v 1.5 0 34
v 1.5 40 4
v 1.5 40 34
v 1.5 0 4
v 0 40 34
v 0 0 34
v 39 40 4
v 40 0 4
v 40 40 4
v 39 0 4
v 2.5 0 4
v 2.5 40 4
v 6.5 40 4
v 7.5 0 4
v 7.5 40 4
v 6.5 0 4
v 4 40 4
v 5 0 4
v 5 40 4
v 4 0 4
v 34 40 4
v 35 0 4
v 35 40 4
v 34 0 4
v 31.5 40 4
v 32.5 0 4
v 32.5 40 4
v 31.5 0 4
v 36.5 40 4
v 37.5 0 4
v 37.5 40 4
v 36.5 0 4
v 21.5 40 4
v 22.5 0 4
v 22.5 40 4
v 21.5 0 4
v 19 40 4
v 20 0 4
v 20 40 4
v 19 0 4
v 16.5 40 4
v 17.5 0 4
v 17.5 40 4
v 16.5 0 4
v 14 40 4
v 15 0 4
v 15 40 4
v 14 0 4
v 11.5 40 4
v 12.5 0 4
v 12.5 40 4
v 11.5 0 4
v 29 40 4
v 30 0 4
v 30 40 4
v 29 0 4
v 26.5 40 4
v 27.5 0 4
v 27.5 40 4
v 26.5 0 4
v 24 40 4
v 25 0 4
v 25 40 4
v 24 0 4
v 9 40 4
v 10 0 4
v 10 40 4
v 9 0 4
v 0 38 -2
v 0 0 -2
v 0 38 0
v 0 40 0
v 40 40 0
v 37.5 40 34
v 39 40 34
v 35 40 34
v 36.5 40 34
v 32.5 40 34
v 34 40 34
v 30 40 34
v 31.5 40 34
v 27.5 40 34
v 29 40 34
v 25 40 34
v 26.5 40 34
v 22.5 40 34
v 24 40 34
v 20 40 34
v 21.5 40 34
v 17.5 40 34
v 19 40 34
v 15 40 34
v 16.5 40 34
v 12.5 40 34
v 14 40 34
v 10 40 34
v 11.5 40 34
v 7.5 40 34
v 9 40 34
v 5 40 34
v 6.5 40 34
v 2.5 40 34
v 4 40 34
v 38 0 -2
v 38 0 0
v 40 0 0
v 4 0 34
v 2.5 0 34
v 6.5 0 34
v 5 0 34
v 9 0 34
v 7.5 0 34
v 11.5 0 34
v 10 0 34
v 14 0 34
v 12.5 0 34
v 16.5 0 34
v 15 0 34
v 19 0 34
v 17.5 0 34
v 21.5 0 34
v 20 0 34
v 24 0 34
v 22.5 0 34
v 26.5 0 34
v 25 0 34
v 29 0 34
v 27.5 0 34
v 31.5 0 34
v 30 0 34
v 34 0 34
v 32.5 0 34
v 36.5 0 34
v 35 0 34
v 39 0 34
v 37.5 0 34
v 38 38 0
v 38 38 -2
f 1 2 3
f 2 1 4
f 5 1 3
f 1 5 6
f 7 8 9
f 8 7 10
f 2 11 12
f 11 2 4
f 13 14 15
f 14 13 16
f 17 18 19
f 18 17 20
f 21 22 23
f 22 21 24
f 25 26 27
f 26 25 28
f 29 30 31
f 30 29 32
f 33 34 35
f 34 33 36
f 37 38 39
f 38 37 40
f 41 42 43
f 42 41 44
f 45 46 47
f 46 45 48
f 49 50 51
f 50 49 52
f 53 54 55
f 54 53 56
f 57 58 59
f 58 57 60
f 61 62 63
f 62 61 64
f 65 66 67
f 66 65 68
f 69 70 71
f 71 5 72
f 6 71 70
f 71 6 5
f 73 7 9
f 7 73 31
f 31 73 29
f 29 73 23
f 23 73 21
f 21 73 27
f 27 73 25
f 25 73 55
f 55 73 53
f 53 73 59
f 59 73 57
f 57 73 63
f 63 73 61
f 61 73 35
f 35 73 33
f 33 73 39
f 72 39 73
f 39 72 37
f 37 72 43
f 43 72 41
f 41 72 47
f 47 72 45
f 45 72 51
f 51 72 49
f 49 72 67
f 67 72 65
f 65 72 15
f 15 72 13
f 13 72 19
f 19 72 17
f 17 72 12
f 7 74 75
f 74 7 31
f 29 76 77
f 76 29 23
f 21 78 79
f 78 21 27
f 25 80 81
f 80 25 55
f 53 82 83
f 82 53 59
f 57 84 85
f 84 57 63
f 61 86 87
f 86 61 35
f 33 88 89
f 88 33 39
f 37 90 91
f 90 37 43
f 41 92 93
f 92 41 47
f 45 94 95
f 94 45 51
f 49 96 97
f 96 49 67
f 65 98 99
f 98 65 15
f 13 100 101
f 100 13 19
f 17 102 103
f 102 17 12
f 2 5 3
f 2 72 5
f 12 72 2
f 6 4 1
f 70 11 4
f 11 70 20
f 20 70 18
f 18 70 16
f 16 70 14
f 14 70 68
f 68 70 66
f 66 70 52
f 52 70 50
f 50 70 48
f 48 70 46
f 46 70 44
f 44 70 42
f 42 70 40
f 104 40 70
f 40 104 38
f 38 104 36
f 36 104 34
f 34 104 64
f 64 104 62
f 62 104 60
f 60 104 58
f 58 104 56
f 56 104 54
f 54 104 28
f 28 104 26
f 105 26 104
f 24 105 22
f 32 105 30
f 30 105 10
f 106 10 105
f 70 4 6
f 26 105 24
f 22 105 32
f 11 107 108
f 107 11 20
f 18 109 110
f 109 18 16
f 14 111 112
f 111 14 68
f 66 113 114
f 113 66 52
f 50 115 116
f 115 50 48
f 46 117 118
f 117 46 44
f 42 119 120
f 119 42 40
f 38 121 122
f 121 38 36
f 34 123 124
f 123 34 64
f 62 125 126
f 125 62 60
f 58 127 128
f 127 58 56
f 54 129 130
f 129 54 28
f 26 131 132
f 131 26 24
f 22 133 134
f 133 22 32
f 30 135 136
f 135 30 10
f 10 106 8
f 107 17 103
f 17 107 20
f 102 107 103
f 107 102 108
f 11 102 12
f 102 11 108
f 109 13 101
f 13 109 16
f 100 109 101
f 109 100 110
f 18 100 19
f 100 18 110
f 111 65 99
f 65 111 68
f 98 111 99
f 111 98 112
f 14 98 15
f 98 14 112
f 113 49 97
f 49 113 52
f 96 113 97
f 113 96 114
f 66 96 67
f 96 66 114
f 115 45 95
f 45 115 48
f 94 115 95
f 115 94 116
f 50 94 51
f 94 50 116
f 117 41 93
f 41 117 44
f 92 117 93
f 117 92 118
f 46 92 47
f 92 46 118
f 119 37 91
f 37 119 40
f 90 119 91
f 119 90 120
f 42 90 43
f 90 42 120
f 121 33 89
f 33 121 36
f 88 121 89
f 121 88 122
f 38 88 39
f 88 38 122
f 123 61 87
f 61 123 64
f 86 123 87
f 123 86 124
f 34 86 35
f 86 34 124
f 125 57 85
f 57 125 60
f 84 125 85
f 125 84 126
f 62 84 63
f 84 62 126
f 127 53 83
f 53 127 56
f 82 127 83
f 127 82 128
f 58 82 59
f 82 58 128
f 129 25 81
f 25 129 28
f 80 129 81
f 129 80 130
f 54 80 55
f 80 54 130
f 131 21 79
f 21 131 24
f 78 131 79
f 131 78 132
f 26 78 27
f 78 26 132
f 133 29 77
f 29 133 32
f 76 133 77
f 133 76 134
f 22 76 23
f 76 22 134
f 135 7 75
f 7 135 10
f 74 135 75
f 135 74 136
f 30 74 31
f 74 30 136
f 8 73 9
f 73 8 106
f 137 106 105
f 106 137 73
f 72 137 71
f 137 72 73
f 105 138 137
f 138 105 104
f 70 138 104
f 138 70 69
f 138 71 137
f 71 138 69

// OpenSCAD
// Generated by Text-to-CAD from prompt:
// a CPU cooler, 50 mm base, 20 fins
$fn = 64;

module CPUHeatsink() {
cube([40, 40, 4]);
for (i = [0 : 15]) translate([2.5*i, 0*i, 0*i]) {
    translate([0, 0, 4]) {
        cube([1.5, 40, 30]);
    }
}
    translate([0, 0, -2]) {
    cube([38, 38, 2]);
    }
    translate([11, 11, -0.8]) {
    cube([18, 18, 0.8]);
    }
}

CPUHeatsink();
